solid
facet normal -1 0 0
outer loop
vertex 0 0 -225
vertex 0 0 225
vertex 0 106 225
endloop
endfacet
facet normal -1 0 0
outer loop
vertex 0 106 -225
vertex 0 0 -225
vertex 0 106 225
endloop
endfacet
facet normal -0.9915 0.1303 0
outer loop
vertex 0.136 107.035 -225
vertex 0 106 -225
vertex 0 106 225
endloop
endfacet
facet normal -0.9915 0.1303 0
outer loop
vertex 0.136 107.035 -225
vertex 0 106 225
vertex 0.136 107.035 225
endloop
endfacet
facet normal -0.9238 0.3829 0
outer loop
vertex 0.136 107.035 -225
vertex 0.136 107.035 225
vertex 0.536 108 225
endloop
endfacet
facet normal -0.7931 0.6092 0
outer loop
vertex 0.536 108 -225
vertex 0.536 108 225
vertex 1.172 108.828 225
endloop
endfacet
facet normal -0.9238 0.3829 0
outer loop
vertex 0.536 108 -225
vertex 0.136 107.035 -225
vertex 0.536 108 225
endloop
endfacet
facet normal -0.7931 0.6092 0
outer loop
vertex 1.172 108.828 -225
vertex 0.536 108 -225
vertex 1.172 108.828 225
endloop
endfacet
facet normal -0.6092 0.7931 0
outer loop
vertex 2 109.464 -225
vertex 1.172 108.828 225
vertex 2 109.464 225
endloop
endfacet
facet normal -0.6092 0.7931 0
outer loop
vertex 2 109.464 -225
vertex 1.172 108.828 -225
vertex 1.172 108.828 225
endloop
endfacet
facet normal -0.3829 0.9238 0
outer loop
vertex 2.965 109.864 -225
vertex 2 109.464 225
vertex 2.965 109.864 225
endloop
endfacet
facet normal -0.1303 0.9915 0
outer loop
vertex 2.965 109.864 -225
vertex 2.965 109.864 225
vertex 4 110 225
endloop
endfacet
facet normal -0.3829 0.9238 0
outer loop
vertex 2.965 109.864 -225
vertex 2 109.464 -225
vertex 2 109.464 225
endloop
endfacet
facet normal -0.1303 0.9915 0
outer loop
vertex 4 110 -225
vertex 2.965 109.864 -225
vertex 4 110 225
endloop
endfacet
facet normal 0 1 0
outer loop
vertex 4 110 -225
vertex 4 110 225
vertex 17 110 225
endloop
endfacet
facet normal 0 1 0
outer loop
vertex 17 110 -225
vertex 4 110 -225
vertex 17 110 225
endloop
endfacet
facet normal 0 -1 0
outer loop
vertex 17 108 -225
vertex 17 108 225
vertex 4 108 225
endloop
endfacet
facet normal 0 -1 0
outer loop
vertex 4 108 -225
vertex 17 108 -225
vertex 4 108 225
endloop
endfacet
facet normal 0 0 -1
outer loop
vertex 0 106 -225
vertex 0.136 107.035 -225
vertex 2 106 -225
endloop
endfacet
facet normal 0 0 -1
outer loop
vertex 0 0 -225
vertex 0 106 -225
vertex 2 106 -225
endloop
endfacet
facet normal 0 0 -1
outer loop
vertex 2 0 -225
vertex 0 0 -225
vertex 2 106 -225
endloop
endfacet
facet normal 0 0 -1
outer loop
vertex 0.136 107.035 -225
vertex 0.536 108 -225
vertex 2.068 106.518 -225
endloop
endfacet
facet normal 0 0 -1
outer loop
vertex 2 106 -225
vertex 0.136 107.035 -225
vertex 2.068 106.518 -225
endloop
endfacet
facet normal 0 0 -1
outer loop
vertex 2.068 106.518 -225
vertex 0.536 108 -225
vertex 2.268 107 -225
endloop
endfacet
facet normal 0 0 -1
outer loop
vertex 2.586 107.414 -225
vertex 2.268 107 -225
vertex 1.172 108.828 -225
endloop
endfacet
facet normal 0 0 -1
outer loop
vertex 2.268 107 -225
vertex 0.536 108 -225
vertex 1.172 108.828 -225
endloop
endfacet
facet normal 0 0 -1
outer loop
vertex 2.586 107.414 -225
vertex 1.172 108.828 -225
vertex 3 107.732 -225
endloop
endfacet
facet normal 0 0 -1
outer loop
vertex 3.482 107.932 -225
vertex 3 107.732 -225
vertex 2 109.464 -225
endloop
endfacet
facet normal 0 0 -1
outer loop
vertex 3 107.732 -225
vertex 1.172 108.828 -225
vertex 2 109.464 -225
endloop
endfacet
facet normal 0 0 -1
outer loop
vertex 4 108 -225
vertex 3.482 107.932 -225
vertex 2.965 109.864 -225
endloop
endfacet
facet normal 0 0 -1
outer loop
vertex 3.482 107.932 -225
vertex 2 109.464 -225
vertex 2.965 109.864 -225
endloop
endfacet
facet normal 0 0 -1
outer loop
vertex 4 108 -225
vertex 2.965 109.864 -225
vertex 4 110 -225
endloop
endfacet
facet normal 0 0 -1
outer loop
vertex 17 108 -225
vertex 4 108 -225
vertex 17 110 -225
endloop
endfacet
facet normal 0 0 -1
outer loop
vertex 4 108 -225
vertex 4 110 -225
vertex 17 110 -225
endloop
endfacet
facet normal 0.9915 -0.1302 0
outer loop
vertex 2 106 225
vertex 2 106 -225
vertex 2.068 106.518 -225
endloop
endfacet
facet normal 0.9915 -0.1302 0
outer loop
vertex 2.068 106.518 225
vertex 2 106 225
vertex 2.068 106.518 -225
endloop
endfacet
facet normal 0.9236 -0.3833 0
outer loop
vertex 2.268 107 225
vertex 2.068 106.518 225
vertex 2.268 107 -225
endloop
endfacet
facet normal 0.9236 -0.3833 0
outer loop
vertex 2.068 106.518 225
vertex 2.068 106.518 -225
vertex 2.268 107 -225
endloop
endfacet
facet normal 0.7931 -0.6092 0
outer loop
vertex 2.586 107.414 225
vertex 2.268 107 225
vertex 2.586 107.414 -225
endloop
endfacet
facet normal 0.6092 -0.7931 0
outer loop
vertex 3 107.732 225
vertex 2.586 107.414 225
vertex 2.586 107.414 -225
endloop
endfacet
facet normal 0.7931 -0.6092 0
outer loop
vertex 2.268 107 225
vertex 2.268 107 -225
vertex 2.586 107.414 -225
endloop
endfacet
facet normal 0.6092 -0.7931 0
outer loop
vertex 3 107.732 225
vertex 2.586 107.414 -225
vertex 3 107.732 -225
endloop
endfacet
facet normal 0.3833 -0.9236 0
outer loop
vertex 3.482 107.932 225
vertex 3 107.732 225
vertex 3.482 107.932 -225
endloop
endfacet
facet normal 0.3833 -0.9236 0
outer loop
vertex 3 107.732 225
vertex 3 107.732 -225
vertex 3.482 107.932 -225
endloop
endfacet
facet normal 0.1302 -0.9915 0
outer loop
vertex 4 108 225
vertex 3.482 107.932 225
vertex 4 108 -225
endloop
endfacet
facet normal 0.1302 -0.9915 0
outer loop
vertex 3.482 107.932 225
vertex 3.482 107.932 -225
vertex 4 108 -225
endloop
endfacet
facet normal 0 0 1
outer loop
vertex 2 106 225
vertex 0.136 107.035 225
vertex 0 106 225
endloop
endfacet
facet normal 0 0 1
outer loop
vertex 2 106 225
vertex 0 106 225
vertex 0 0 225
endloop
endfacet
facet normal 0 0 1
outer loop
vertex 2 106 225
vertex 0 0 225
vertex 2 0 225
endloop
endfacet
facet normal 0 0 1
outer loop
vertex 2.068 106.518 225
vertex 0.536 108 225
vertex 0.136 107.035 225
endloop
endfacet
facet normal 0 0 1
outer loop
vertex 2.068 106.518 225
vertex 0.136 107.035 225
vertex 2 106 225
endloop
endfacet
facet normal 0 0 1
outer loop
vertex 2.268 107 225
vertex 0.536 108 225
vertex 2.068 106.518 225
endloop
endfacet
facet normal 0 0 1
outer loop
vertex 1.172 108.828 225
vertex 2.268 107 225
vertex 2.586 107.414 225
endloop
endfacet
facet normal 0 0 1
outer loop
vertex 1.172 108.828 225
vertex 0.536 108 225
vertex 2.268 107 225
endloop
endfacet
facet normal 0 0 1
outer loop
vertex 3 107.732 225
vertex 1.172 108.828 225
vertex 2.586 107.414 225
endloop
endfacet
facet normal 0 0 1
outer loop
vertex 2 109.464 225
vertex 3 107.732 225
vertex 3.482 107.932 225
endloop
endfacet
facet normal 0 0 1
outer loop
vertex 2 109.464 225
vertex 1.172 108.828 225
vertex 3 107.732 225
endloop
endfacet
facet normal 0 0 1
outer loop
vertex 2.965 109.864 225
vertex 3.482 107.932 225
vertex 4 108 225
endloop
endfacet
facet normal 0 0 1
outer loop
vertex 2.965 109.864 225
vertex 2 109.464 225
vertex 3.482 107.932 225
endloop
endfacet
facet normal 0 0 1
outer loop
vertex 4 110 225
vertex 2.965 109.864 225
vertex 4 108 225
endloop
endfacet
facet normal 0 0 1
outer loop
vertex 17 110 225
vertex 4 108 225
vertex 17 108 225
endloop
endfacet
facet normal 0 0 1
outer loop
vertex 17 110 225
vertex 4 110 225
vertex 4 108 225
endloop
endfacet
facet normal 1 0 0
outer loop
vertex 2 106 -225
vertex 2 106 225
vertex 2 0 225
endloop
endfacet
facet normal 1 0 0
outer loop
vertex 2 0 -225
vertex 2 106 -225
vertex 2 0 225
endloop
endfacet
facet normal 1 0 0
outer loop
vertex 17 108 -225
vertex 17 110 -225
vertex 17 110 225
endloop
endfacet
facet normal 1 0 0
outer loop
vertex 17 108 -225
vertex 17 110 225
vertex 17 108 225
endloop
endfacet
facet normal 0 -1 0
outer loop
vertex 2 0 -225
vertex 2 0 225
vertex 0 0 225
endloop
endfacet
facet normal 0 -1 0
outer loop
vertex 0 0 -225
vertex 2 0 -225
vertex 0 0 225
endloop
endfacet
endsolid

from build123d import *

# Parameters (mm, degrees)
BOSS_EXTRUDE1_DEPTH    = 225
CONVERT_SOLID1_START   = -225
CONVERT_SOLID1_DEPTH   = 450
CONVERT_SOLID1_2_DEPTH = 450


# Read off the part's stored shape, not the designer's step: Convert-Solid1
with BuildPart() as part:
    # Sketch1 → Boss-Extrude1 (new, symmetric)
    with BuildSketch(Plane.XY):
        Polygon((0, 0), (0, 110), (17, 110), (17, 108), (2, 108), (2, 0), align=None)
    extrude(amount=BOSS_EXTRUDE1_DEPTH, both=True)

    # Convert-Solid1 outline → Convert-Solid1 (cut)
    with BuildSketch(Plane.XY.offset(CONVERT_SOLID1_START)):
        with BuildLine():
            ThreePointArc((0, 106), (1.171572875, 108.828427125), (4, 110))
            Line((4, 110), (0, 110))
            Line((0, 110), (0, 106))
        make_face()
    extrude(amount=CONVERT_SOLID1_DEPTH, mode=Mode.SUBTRACT)

    # Convert-Solid1 2 outline → Convert-Solid1 2 (add)
    with BuildSketch(Plane.XY.offset(CONVERT_SOLID1_START)):
        with BuildLine():
            ThreePointArc((2, 106), (2.585786438, 107.414213562), (4, 108))
            Line((4, 108), (2, 108))
            Line((2, 108), (2, 106))
        make_face()
    extrude(amount=CONVERT_SOLID1_2_DEPTH)


solid = part.part
